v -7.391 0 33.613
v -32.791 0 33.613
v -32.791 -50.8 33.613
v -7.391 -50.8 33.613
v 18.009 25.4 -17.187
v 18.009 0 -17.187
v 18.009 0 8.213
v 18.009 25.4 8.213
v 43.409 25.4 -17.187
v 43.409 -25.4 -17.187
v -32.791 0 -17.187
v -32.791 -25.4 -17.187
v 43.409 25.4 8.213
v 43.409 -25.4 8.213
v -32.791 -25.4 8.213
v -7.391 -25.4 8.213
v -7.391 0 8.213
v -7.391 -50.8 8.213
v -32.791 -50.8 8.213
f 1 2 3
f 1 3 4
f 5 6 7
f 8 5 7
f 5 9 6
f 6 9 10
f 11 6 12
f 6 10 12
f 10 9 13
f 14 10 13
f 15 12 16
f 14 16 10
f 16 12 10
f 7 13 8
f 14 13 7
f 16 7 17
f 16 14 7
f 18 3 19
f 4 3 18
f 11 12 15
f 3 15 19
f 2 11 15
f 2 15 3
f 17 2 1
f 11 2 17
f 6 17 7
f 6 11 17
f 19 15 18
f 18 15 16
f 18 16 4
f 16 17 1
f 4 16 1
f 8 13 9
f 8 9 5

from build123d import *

# Parameters (mm, degrees)
F0_W     = 76.2
F0_H     = 25.4
F1_DEPTH = 25.4
F2_W     = 25.4
F2_H     = 25.4
F3_DEPTH = 25.4
F4_W     = 25.4
F4_H     = 25.4
F5_DEPTH = 25.4
F6_W     = 25.4
F6_H     = 25.4
F7_DEPTH = 25.4


with BuildPart() as f1:
    # F0 (on Front) → F1 (new body)
    with BuildSketch(Plane.XZ):
        with Locations((5.309489, -4.486644)):
            Rectangle(F0_W, F0_H)
    extrude(amount=F1_DEPTH)

    # F2 (on face) → F3 (join)
    with BuildSketch(Plane(origin=(0, 0, 0), x_dir=(-1, 0, 0), z_dir=(0, 1, 0))):
        with Locations((-30.709489, -4.486644)):
            Rectangle(F2_W, F2_H)
    extrude(amount=F3_DEPTH)

    # F4 (on face) → F5 (join)
    with BuildSketch(Plane.XY.offset(8.213356)):
        with Locations((-20.090511, -12.7)):
            Rectangle(F4_W, F4_H)
    extrude(amount=F5_DEPTH)

    # F6 (on face) → F7 (join)
    with BuildSketch(Plane.XZ.offset(25.4)):
        with Locations((-20.090511, 20.913356)):
            Rectangle(F6_W, F6_H)
    extrude(amount=F7_DEPTH)


solid = f1.part
